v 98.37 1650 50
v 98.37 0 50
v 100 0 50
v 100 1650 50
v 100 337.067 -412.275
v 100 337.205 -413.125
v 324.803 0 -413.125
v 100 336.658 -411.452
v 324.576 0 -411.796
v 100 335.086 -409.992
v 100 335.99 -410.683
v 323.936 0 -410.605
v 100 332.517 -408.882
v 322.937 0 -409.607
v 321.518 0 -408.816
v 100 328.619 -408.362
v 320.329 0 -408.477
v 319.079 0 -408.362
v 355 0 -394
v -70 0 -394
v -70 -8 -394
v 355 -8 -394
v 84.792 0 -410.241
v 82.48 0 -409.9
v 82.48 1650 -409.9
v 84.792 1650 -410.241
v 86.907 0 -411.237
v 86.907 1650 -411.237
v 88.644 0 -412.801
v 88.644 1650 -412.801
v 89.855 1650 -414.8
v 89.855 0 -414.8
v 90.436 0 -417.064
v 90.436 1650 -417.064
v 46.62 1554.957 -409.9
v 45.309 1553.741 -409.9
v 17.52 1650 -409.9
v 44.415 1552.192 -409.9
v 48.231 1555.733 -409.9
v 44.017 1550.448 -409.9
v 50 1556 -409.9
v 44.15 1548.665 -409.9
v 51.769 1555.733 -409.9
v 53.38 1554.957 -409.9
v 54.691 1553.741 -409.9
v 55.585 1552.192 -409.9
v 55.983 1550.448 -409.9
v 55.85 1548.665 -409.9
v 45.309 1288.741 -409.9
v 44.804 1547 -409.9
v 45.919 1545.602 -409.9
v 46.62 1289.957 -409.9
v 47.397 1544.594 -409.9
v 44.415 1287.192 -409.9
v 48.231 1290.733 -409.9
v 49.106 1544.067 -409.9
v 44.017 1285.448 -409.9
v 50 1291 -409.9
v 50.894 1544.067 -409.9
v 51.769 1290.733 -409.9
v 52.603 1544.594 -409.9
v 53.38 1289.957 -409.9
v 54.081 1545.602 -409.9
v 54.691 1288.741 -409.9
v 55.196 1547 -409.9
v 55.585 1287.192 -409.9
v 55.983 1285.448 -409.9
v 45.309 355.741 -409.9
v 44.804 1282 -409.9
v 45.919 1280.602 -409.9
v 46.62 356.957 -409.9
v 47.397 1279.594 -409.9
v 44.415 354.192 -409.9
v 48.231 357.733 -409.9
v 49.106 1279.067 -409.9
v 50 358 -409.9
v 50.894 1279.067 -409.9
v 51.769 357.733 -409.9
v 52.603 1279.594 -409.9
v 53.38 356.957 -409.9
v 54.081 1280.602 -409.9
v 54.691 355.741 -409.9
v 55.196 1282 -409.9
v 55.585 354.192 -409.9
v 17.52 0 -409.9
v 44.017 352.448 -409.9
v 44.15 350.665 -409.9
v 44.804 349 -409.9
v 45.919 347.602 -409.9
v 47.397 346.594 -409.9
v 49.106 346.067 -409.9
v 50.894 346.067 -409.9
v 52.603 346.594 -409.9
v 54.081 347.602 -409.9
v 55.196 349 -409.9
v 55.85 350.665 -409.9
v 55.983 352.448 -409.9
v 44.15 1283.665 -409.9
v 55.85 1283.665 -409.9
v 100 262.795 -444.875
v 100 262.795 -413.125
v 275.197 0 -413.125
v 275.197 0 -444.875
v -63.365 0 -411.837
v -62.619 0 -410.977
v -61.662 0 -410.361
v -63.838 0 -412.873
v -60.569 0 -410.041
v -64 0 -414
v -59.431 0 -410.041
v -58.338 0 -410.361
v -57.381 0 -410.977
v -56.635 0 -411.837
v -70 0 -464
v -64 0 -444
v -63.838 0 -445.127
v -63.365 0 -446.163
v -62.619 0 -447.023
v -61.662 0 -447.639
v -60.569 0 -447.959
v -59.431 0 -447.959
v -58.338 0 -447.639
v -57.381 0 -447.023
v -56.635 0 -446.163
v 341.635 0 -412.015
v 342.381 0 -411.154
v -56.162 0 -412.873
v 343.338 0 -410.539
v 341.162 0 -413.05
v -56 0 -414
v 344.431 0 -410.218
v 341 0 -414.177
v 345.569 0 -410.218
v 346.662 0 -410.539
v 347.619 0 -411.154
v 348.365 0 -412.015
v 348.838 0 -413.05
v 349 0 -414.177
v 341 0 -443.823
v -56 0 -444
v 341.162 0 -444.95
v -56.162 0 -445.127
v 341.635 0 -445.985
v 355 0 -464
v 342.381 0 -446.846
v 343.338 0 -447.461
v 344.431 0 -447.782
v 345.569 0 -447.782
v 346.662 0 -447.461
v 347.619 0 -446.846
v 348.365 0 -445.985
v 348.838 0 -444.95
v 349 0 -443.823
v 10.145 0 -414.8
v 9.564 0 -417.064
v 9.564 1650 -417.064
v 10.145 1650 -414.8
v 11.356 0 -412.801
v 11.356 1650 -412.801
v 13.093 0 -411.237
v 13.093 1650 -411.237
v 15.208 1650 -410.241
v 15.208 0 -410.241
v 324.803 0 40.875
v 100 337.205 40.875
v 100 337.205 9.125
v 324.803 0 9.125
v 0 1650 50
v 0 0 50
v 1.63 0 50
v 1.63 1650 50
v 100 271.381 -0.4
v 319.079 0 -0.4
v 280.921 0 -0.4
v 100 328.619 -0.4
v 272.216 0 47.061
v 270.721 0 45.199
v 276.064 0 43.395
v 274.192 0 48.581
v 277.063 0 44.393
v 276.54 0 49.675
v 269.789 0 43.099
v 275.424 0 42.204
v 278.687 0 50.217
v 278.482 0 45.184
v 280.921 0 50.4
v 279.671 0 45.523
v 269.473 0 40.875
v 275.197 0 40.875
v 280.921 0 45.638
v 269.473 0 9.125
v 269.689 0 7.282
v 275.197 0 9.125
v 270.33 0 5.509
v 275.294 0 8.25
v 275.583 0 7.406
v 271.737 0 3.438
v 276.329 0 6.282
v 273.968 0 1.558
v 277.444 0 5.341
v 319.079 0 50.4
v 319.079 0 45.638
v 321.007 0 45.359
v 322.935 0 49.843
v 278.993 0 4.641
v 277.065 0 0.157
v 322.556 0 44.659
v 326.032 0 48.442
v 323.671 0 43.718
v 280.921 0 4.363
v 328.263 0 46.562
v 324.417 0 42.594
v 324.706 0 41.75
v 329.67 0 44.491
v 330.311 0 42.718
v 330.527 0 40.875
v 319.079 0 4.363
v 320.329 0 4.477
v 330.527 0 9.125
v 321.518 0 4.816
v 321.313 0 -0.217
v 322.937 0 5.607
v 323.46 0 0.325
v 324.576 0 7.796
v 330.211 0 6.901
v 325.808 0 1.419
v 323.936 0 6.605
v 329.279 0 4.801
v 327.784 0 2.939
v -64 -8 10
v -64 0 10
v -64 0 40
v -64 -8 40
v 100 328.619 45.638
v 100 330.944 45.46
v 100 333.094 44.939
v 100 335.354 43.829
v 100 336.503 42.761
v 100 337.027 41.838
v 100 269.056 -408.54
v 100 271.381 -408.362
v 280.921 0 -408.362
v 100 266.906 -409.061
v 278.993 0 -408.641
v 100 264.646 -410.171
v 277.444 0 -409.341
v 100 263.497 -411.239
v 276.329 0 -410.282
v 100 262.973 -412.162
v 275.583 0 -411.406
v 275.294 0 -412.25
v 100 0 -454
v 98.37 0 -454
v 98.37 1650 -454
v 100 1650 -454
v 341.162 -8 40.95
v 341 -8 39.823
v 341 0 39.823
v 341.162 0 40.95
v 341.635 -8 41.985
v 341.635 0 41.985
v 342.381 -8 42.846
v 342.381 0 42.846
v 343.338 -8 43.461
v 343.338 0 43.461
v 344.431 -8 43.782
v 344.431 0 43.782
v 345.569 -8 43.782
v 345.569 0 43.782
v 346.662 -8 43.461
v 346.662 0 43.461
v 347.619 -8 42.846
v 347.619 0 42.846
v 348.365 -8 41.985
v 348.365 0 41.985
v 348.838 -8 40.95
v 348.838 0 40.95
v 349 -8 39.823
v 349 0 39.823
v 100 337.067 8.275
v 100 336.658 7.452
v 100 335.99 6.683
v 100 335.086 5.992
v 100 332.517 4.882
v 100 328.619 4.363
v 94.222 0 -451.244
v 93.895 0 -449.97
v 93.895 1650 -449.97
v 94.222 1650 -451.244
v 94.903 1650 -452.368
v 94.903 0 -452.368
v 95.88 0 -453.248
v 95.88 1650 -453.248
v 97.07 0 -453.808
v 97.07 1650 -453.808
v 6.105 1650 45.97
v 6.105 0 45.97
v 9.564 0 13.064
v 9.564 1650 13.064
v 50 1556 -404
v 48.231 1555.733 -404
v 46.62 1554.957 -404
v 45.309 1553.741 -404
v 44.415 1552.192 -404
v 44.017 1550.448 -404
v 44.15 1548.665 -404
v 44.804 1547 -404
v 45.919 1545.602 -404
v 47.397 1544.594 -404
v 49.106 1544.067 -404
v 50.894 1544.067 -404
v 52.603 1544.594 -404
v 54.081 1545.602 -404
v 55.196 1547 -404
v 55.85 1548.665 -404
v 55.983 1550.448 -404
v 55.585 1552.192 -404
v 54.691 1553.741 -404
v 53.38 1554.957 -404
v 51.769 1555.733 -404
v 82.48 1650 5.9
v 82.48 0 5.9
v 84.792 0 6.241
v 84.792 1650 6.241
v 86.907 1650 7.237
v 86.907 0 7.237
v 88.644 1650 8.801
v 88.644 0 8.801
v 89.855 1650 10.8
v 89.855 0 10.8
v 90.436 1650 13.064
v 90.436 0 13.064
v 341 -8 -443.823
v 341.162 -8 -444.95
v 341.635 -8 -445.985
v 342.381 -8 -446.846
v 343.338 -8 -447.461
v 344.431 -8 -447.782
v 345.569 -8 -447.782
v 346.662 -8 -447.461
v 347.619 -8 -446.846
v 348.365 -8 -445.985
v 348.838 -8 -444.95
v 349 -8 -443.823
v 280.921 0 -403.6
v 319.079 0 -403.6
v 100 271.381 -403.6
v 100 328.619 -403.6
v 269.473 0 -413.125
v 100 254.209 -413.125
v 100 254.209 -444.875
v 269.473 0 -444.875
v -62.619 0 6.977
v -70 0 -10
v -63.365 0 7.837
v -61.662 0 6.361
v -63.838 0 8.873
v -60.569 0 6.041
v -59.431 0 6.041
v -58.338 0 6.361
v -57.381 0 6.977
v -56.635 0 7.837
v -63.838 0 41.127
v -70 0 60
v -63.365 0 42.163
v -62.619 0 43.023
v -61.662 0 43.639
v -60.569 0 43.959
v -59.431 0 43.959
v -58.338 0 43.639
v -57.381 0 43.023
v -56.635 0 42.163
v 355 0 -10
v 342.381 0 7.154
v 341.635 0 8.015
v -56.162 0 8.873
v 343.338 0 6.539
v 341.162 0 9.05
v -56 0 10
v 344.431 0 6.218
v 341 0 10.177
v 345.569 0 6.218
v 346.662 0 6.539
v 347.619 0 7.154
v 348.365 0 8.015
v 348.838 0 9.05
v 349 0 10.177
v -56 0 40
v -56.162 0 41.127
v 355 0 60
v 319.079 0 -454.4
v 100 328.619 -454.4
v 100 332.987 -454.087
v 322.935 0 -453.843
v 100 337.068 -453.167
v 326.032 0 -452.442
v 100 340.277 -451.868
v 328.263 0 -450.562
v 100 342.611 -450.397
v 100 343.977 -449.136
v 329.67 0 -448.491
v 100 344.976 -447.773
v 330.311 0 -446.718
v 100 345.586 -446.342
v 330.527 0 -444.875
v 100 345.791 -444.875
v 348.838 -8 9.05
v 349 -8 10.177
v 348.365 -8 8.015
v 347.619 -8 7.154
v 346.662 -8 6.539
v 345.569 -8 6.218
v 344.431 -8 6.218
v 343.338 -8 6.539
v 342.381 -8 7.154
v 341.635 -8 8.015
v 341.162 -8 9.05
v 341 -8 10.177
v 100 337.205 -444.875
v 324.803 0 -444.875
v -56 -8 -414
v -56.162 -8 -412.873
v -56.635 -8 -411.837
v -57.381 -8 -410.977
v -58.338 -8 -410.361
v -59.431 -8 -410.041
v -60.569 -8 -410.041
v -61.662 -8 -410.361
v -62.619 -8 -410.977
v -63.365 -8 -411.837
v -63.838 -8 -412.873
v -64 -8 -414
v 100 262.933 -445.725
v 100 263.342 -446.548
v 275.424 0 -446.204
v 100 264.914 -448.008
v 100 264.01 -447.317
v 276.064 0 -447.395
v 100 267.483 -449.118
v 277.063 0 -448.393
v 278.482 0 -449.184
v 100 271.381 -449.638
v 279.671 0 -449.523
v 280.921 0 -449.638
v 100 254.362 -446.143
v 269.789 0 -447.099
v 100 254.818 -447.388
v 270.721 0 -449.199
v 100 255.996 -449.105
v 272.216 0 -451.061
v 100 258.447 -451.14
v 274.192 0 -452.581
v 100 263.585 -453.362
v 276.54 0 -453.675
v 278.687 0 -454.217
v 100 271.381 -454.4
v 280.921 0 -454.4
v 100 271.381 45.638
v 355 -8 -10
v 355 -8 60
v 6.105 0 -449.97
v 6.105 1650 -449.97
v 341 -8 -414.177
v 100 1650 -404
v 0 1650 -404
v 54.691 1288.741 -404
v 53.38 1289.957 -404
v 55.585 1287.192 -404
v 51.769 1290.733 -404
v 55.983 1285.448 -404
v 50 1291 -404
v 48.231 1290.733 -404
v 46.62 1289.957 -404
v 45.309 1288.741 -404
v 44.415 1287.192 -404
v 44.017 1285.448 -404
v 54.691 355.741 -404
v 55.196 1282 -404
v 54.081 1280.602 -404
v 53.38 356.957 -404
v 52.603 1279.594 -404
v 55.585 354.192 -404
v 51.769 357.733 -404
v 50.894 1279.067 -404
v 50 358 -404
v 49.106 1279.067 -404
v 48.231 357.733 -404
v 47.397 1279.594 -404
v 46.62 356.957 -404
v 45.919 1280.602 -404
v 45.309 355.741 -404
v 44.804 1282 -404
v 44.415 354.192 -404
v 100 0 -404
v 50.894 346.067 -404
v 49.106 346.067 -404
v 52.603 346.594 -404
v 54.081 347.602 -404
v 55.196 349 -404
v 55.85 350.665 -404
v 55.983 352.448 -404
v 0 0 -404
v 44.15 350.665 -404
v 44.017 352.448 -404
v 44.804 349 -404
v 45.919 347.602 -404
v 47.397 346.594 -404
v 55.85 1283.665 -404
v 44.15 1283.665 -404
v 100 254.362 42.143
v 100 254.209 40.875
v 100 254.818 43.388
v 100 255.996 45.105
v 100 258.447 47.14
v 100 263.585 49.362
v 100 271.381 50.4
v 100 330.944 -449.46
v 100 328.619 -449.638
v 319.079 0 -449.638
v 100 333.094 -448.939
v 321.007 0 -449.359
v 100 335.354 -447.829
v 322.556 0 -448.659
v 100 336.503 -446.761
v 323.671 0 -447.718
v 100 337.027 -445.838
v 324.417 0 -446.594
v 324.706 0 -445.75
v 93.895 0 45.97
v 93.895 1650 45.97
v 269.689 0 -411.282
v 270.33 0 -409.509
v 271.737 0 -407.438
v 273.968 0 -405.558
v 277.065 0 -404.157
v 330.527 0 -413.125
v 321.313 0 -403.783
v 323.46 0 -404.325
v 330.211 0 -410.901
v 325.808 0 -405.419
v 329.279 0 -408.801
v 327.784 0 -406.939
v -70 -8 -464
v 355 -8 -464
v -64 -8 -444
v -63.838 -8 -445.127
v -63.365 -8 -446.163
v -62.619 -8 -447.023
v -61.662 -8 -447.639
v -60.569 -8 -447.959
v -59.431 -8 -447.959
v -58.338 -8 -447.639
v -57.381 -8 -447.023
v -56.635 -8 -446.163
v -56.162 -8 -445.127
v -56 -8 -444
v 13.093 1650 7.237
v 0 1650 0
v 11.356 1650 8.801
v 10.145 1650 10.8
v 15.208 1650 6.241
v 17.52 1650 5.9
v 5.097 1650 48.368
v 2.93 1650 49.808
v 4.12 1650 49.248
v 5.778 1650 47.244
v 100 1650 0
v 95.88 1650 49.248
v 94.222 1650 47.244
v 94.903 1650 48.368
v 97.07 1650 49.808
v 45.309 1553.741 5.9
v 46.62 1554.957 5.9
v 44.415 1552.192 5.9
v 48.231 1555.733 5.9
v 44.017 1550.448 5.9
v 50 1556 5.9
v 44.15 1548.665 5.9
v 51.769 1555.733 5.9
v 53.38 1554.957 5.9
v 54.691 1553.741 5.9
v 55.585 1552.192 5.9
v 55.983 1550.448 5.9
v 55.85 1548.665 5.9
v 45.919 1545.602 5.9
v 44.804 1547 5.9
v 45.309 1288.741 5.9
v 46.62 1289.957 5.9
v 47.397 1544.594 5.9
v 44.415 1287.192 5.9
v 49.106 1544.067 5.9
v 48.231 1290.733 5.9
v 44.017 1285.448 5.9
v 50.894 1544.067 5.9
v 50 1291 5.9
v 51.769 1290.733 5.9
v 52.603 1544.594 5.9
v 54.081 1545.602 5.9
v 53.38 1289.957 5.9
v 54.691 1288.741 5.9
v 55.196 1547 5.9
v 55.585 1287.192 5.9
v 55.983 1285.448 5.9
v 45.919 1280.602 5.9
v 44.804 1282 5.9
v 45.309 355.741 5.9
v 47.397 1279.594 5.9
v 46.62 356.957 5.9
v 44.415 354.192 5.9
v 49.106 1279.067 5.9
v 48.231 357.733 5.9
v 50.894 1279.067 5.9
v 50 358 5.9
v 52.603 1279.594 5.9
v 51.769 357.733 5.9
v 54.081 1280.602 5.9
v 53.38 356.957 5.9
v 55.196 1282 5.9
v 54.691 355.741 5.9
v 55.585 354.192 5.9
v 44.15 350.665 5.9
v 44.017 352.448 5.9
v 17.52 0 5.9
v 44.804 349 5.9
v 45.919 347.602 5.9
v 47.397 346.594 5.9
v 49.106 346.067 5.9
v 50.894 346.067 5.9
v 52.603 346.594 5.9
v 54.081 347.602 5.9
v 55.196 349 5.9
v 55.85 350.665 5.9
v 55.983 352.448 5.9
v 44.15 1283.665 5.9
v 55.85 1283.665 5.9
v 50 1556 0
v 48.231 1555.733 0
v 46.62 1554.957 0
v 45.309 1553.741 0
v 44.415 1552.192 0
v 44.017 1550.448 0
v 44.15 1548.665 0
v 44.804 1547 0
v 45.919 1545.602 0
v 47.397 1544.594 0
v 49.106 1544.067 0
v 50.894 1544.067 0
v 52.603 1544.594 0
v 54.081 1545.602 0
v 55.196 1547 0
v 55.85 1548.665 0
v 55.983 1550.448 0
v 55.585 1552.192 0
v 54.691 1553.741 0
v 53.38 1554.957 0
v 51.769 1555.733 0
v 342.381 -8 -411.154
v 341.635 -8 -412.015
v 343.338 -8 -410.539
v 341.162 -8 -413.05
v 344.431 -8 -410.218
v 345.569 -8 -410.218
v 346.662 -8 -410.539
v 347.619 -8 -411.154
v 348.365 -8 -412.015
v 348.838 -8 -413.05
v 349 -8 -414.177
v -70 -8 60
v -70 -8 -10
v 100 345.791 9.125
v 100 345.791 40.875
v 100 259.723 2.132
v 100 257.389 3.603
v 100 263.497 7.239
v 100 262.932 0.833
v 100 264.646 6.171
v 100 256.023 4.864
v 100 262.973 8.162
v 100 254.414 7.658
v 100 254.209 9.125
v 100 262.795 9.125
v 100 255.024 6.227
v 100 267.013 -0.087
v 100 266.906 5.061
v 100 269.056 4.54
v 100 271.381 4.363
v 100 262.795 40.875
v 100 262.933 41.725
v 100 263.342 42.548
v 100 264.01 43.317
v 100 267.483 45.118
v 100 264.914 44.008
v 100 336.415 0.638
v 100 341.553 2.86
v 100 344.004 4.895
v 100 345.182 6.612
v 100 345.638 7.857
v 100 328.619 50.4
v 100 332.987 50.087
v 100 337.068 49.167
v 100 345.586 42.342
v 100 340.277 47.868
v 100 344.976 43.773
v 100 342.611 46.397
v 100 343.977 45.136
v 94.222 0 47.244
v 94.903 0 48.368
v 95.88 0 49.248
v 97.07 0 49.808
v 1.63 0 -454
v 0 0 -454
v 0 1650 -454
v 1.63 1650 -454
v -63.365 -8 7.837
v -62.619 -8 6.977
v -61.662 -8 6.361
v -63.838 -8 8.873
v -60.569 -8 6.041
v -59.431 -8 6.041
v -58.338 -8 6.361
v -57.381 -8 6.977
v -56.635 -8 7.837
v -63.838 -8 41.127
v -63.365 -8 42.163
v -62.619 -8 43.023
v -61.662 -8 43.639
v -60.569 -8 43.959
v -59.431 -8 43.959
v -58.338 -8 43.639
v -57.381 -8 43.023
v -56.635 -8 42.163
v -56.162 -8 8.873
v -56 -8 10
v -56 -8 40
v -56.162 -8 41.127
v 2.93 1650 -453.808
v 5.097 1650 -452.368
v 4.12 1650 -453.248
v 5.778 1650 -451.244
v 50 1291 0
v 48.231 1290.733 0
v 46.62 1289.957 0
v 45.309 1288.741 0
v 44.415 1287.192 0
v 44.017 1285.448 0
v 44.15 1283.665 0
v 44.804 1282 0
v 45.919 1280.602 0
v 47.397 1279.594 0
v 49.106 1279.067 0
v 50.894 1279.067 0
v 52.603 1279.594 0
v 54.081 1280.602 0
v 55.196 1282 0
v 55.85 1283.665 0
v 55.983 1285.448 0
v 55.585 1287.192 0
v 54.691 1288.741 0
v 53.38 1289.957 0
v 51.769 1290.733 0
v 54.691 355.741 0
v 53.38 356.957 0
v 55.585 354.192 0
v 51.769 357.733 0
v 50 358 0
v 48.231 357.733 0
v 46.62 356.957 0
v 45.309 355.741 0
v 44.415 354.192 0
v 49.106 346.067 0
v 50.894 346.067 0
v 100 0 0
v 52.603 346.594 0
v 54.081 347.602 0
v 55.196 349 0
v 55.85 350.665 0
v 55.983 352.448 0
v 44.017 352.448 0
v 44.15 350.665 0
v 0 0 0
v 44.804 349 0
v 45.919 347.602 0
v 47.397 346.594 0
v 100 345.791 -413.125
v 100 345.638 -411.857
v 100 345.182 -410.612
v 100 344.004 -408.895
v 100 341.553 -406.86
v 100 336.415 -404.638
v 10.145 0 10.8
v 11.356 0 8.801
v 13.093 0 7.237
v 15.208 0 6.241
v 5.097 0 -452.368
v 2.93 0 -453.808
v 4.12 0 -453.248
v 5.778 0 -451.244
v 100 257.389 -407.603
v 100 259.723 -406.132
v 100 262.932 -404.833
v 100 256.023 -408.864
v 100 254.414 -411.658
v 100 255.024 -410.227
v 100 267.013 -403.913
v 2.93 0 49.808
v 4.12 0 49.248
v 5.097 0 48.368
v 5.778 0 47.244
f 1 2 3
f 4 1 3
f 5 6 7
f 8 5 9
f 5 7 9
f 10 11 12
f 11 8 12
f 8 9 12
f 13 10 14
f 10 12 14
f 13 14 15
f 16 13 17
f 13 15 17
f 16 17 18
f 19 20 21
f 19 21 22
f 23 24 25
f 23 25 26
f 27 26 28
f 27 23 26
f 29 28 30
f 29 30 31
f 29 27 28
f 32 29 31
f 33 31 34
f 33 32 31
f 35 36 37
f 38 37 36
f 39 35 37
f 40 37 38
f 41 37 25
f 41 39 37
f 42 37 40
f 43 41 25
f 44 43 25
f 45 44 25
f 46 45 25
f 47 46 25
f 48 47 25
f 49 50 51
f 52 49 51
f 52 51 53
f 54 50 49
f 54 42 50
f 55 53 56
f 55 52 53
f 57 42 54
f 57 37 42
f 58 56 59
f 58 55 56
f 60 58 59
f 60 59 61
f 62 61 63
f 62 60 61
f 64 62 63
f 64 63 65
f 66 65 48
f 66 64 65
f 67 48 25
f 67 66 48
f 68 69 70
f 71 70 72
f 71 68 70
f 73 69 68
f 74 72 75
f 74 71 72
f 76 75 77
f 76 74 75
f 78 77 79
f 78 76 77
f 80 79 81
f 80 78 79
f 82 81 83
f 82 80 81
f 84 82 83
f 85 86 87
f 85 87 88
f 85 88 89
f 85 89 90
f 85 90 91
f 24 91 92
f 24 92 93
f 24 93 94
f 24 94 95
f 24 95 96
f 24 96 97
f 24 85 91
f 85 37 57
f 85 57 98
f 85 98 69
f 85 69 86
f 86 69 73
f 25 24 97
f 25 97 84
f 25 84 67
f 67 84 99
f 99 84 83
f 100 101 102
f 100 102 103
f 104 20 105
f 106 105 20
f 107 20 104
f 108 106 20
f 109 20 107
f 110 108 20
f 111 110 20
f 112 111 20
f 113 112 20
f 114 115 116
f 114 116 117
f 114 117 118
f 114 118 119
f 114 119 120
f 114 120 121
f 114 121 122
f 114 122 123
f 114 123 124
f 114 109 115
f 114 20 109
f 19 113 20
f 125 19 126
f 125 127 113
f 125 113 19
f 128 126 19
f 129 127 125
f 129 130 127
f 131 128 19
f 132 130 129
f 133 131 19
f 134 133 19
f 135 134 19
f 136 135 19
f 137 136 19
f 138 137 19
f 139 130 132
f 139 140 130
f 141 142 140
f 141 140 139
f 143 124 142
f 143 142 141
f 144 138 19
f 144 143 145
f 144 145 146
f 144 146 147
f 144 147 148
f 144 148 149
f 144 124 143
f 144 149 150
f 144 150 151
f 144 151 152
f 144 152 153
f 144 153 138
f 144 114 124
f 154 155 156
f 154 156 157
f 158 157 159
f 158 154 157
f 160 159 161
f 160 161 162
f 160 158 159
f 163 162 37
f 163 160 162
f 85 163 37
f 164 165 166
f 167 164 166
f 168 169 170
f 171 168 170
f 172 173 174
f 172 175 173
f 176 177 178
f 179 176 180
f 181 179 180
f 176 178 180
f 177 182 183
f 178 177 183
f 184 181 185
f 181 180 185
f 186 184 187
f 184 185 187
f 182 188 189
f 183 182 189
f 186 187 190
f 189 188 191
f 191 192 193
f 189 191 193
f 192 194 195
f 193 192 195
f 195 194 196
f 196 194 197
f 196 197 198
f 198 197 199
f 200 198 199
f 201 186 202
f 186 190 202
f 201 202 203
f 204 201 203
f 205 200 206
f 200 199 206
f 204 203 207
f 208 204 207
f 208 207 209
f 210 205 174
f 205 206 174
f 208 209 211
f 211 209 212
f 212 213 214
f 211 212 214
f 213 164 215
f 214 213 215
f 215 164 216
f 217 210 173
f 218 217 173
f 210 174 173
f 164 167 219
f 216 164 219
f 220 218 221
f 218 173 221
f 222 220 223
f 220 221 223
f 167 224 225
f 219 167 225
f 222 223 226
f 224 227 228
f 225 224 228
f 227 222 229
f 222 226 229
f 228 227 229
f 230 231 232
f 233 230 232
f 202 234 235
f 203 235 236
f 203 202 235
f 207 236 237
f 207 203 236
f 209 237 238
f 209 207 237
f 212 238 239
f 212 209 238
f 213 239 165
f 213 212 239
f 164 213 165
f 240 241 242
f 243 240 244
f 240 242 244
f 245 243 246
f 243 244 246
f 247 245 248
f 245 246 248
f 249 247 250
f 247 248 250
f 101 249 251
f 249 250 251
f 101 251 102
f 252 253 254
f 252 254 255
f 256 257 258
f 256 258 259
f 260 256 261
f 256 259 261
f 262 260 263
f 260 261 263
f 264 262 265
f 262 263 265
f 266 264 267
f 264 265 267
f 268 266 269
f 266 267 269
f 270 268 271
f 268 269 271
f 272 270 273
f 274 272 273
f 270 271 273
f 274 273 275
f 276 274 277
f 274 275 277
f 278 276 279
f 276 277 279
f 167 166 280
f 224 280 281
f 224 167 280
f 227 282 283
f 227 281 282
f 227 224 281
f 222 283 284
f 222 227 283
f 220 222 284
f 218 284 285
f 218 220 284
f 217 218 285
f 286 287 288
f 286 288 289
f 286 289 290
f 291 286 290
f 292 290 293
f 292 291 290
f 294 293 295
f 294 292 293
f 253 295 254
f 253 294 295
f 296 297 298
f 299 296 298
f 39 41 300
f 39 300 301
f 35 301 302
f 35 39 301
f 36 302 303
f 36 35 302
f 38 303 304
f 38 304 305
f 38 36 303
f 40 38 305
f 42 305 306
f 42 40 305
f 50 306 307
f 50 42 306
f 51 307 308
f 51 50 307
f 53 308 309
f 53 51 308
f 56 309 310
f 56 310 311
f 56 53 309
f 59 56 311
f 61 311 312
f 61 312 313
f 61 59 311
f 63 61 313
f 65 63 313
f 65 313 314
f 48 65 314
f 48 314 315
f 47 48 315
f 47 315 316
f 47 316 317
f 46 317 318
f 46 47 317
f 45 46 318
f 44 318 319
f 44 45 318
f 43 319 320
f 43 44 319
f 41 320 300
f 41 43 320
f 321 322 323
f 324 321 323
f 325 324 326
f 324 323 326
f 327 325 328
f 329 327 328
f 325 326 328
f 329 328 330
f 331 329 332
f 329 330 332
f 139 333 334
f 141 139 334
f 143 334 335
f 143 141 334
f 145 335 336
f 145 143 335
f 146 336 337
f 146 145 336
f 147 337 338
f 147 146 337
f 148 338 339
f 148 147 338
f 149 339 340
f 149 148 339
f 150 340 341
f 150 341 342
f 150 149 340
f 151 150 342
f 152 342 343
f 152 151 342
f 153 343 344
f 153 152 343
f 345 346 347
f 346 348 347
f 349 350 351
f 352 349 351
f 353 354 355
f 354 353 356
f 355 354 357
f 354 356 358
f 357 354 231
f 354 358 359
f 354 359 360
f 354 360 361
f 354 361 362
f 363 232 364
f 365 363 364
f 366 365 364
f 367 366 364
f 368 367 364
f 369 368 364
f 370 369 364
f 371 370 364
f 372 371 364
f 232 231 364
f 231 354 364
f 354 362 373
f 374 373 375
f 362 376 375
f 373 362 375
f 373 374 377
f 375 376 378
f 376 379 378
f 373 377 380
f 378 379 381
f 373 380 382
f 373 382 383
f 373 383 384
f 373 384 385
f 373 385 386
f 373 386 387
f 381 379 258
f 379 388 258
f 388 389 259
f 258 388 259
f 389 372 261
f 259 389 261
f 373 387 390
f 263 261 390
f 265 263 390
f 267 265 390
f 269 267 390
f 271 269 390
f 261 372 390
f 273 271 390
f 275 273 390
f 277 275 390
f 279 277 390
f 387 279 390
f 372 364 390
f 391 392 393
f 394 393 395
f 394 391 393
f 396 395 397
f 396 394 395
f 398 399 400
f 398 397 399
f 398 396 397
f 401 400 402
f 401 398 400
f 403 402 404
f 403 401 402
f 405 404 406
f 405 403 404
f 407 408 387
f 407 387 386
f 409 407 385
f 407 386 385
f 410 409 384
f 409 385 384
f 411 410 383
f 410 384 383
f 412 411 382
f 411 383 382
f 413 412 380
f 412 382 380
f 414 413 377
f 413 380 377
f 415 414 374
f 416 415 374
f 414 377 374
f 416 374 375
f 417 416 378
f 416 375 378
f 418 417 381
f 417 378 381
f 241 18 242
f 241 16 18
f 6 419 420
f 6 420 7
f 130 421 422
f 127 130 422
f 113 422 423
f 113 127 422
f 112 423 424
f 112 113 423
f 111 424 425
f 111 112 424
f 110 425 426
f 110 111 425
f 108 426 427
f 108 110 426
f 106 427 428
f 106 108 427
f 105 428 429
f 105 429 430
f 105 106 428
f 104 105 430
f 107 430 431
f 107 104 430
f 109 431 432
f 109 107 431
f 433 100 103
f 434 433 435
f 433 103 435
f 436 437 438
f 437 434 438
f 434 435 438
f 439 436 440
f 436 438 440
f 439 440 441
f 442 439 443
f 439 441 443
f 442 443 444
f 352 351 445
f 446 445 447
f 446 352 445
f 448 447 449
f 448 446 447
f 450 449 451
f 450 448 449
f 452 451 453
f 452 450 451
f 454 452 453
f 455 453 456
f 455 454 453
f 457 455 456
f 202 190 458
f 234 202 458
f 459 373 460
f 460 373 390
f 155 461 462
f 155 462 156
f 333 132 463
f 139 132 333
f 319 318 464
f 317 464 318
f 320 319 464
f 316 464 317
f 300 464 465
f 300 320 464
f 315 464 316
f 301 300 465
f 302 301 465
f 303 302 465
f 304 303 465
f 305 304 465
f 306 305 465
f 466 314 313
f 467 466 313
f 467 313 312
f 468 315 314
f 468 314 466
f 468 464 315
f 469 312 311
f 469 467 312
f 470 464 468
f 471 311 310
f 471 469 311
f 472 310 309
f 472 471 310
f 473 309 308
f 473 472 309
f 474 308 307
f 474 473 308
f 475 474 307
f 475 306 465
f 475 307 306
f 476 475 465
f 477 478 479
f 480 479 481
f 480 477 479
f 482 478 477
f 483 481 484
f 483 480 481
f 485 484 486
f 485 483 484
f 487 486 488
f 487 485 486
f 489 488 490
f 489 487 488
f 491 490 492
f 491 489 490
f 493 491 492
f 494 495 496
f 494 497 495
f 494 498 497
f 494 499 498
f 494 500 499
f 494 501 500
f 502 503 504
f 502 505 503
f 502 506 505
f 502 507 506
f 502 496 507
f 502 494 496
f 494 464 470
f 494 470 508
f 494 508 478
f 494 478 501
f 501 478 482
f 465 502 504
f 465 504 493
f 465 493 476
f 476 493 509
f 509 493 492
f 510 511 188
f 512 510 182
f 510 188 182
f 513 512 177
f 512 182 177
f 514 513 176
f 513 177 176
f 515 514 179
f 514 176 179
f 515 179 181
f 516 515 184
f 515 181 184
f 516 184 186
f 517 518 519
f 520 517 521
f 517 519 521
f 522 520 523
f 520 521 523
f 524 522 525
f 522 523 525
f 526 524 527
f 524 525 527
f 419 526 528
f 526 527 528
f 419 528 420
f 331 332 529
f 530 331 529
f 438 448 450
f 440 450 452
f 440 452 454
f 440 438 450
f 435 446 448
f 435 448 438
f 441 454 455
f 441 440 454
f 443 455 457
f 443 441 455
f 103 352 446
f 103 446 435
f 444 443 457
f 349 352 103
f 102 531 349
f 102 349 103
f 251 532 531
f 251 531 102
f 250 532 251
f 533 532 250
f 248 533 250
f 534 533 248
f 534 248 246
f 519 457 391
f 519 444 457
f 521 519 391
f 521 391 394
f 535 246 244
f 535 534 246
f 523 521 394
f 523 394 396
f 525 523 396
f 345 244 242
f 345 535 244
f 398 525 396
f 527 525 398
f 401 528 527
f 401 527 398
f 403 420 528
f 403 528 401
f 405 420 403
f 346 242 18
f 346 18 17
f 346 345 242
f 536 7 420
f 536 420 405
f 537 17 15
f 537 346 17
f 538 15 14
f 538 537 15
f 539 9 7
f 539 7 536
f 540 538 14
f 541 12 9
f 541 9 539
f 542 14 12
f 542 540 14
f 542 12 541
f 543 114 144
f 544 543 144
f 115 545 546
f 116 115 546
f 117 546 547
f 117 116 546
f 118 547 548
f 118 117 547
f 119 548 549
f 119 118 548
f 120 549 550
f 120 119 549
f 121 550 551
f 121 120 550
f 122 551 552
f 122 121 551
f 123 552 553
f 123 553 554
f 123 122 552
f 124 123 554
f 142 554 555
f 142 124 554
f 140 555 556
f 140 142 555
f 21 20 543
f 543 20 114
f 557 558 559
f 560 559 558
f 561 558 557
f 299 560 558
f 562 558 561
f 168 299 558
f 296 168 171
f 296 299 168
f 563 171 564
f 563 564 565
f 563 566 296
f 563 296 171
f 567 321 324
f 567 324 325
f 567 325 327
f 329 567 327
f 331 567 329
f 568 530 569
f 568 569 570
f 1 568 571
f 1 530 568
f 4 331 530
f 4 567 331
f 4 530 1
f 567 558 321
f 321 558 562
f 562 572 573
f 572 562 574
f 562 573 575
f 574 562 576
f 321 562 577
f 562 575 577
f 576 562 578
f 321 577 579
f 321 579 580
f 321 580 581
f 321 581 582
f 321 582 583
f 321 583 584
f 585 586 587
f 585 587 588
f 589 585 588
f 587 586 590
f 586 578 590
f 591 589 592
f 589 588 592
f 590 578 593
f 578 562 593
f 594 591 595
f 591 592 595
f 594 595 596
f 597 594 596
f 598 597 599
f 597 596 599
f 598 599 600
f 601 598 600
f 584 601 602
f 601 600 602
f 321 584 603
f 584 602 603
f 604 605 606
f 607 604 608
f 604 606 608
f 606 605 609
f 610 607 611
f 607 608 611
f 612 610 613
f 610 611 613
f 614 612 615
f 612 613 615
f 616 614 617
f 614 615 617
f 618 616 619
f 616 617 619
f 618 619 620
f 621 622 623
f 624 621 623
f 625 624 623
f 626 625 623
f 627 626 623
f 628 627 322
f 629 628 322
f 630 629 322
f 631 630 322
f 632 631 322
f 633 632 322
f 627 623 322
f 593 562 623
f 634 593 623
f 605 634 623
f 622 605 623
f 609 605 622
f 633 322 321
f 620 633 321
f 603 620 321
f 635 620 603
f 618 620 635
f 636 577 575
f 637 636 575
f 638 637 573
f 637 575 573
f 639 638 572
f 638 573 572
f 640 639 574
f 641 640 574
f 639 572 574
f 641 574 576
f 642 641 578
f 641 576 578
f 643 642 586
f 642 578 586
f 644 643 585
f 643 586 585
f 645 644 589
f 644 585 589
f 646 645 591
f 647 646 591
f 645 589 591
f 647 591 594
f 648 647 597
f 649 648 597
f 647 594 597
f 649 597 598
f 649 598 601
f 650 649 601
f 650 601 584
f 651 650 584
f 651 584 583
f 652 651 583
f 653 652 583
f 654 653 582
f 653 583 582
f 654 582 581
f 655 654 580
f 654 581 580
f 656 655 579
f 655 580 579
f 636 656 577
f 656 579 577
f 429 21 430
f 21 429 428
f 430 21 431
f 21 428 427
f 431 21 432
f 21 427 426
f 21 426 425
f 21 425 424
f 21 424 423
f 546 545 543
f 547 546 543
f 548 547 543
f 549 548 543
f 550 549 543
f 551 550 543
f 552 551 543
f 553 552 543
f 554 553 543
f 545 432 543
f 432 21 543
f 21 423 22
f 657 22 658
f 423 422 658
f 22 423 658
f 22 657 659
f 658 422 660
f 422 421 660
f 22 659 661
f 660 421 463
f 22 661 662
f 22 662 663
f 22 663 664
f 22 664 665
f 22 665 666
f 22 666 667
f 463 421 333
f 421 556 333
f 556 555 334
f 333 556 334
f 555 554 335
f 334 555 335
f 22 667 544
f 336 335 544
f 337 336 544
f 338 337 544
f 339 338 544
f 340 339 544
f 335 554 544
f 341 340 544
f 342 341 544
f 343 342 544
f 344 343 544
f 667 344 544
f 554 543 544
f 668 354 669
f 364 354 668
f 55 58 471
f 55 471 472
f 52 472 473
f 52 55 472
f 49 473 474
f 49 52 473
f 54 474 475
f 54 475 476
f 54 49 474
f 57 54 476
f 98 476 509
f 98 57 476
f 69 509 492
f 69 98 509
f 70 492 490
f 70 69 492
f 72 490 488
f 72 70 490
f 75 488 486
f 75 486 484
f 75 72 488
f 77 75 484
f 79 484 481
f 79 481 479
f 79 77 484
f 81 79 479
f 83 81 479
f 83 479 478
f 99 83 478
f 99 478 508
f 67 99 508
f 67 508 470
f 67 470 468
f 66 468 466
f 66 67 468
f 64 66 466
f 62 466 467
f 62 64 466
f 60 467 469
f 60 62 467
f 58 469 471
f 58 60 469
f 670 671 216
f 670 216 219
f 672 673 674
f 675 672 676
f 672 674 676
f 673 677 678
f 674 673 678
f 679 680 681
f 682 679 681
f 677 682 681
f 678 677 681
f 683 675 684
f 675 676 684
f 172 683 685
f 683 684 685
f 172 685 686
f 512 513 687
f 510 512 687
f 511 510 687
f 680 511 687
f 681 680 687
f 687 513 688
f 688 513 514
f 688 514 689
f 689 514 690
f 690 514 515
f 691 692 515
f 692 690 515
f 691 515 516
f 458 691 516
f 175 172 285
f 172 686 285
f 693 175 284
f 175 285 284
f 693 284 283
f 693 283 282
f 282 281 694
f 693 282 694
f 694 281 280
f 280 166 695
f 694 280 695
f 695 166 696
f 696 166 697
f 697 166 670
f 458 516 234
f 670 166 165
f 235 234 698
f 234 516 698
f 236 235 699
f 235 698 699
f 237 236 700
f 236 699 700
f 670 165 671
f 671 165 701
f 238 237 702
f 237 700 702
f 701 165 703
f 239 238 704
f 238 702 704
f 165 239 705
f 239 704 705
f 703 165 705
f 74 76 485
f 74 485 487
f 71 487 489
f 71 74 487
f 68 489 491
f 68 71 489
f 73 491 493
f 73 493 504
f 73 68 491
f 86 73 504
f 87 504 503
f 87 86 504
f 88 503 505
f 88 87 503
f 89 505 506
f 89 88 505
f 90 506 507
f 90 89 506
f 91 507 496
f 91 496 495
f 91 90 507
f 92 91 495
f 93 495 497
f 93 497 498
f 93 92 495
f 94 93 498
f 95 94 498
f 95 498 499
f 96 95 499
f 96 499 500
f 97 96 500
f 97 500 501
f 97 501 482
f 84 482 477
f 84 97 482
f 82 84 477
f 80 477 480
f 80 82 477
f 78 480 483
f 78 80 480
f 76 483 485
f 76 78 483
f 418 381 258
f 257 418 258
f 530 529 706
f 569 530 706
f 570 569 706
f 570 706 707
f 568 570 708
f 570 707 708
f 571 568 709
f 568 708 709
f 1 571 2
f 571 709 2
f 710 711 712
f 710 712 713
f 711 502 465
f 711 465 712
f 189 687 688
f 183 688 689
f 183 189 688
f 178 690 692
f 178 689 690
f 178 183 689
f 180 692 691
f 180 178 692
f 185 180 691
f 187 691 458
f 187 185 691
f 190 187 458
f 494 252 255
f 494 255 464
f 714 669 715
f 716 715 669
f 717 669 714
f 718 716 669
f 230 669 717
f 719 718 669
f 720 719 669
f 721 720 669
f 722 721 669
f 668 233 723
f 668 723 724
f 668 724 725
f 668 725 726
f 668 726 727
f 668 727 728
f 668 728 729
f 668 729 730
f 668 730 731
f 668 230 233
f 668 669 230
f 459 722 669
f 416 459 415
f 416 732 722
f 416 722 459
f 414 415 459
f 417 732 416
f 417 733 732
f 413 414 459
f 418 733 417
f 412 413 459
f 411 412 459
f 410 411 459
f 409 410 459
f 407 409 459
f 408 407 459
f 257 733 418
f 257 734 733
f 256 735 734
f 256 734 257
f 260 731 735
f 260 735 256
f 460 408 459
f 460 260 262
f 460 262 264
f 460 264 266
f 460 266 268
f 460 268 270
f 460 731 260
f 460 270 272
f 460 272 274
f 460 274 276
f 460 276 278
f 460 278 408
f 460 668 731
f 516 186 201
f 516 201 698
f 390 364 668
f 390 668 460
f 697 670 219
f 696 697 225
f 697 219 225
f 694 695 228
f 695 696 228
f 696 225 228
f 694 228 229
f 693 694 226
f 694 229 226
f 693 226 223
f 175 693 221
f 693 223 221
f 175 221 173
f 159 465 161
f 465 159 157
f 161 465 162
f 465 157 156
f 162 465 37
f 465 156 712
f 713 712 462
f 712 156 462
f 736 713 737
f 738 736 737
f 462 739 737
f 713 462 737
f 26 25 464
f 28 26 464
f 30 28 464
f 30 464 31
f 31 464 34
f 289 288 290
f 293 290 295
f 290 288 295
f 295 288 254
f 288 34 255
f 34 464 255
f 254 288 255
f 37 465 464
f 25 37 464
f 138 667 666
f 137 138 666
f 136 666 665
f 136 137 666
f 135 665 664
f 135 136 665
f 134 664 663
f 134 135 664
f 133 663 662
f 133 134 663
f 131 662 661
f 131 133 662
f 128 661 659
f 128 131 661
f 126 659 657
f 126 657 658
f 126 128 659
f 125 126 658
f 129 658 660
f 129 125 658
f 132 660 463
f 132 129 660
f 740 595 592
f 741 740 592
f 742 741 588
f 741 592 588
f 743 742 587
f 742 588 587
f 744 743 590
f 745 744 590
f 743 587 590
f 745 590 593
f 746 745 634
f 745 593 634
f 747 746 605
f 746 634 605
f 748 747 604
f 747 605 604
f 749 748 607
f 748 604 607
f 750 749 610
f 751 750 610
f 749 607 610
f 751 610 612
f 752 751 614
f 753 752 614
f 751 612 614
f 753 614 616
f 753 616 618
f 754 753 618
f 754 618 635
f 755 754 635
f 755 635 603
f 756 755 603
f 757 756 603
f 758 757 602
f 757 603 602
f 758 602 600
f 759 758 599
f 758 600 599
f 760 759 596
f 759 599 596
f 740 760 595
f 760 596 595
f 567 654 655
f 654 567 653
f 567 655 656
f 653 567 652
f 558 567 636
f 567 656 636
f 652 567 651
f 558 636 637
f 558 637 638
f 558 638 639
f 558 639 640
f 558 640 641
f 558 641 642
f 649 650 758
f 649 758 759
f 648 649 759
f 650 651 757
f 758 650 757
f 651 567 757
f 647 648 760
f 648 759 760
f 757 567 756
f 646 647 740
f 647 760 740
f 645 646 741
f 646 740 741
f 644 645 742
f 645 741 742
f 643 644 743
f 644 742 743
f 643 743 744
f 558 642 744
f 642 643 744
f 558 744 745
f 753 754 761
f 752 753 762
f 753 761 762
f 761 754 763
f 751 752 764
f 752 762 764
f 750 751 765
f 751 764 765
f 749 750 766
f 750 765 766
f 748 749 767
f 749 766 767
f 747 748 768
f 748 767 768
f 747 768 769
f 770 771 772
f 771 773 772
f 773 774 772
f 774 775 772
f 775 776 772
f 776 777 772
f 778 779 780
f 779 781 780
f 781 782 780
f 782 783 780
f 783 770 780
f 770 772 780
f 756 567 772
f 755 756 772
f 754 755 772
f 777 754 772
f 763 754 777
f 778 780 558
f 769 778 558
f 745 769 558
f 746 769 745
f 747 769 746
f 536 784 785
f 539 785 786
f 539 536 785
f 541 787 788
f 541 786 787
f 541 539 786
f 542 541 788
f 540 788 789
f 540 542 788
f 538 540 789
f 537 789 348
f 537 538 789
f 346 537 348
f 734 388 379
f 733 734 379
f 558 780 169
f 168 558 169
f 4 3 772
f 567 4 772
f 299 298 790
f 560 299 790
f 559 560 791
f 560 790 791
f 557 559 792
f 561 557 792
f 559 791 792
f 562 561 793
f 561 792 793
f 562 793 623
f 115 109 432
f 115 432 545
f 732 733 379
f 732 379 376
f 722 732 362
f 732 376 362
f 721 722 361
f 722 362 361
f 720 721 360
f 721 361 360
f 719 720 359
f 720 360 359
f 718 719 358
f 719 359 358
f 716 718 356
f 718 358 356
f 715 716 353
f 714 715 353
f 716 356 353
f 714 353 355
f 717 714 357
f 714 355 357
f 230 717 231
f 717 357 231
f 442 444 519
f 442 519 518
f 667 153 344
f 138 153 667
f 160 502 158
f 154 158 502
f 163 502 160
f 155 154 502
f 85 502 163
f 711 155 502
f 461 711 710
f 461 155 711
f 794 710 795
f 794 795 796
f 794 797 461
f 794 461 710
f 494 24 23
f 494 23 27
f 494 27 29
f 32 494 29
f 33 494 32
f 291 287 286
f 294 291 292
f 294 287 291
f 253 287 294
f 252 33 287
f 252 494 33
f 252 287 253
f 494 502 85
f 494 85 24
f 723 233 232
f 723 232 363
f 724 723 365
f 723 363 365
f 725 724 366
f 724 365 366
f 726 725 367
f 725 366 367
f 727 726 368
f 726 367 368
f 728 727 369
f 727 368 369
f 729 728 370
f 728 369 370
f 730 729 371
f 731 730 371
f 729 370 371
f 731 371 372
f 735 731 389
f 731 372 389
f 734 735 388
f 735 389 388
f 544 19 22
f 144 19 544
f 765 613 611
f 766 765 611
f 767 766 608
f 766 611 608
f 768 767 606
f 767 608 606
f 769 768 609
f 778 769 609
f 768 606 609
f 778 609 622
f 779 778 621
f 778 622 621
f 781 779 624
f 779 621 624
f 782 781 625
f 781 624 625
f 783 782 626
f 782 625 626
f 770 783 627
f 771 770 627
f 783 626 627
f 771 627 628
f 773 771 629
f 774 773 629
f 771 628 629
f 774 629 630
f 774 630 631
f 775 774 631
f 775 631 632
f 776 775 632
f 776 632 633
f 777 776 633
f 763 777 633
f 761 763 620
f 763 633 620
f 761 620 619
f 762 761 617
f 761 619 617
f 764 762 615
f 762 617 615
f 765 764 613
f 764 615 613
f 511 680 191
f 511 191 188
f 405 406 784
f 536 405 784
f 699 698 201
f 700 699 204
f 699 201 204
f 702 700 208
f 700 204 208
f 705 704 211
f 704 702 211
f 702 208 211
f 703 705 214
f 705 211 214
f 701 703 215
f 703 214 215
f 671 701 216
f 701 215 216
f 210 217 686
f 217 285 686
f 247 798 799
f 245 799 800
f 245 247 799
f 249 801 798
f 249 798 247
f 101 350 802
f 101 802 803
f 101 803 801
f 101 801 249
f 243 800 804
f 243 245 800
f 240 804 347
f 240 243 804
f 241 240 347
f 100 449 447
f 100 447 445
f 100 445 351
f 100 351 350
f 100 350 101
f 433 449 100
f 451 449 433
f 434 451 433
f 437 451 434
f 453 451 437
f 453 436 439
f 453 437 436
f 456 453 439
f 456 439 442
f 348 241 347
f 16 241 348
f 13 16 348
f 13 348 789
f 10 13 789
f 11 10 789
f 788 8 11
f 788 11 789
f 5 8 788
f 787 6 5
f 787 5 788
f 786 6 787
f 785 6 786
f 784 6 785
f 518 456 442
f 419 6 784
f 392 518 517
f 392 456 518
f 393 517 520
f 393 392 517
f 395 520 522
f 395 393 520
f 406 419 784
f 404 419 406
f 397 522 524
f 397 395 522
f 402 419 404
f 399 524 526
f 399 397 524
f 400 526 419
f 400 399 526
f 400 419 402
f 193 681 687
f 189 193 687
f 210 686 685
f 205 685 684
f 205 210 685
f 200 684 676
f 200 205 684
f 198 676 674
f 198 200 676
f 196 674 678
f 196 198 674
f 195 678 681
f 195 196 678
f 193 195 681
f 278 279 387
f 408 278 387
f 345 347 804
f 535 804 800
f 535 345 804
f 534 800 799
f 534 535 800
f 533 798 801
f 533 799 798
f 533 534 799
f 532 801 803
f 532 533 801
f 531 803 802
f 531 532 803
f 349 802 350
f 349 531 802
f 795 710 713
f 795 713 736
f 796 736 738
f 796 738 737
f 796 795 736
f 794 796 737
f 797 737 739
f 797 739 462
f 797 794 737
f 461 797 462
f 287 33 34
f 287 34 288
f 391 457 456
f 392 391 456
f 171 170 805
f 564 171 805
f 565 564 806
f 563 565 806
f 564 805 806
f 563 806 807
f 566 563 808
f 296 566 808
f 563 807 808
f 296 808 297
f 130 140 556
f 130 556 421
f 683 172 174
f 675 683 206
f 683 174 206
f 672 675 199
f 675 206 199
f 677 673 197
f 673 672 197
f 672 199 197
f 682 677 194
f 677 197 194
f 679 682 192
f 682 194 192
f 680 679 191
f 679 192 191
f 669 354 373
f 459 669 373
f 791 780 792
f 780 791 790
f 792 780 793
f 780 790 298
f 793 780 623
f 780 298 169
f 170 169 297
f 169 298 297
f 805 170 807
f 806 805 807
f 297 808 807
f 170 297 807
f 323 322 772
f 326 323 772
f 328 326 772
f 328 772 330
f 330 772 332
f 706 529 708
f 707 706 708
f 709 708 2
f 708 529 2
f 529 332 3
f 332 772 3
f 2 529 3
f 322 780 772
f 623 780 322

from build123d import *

# Parameters (mm, degrees)
CEOWNIK_C_100_X_10_1_DEPTH                     = 1650
SZKIC21_W                                      = 425
SZKIC21_H                                      = 70
DODANIE_WYCI_GNI_CIE1_DEPTH                    = 8
RURA_CIENKO_CIENNA_KWADRATOWA_TS2X2X0_18_DEPTH = 524.856349859
SZKIC59_W                                      = 6
SZKIC59_H                                      = 60
OTWORY_USTALAJ_CE_12_0MM1_AT_2_COUNT           = 2
OTWORY_USTALAJ_CE_12_0MM1_AT_2_PITCH           = 265
OTWORY_USTALAJ_CE_12_0MM1_AT_3_COUNT           = 2
OTWORY_USTALAJ_CE_12_0MM1_AT_3_PITCH           = 1198


# Read off the part's stored shape, not the designer's step: Przytnij/Wydłuż2, Przytnij/Wydłuż3
with BuildPart() as part:
    # Sketch118 → Ceownik c 100 X 10(1) (new body)
    with BuildSketch(Plane.ZX):
        with BuildLine():
            Line((50, 100), (0, 100))
            Line((0, 100), (0, 0))
            Line((0, 0), (50, 0))
            Line((50, 0), (50, 1.629852671))
            ThreePointArc((50, 1.629852671), (48.844151715, 4.6409404), (45.970378085, 6.1052012))
            Line((45.970378085, 6.1052012), (13.063772294, 9.563824837))
            ThreePointArc((13.063772294, 9.563824837), (7.954841396, 12.166955149), (5.9, 17.52))
            Line((5.9, 17.52), (5.9, 82.48))
            ThreePointArc((5.9, 82.48), (7.954841396, 87.833044851), (13.063772294, 90.436175163))
            Line((13.063772294, 90.436175163), (45.970378085, 93.8947988))
            ThreePointArc((45.970378085, 93.8947988), (48.844151715, 95.3590596), (50, 98.370147329))
            Line((50, 98.370147329), (50, 100))
        make_face()
    extrude(amount=CEOWNIK_C_100_X_10_1_DEPTH)

    # Szkic59 → Otwory ustalające Ø12.0mm1 (revolve, cut)
    with BuildSketch(Plane(origin=(50, 1550, 0), x_dir=(0, 1, 0), z_dir=(1, 0, 0))):
        with Locations((3, 30)):
            Rectangle(SZKIC59_W, SZKIC59_H)
    otwory_ustalaj_ce_12_0mm1 = revolve(axis=Axis((50, 1550, -6.35), (0, 0, 1)), mode=Mode.SUBTRACT)

    # Otwory ustalające Ø12.0mm1 at 2: Otwory ustalające Ø12.0mm1 ×2
    with Locations(*[(0, -i * OTWORY_USTALAJ_CE_12_0MM1_AT_2_PITCH, 0) for i in range(1, OTWORY_USTALAJ_CE_12_0MM1_AT_2_COUNT)]):
        add(otwory_ustalaj_ce_12_0mm1, mode=Mode.SUBTRACT)

    # Otwory ustalające Ø12.0mm1 at 3: Otwory ustalające Ø12.0mm1 ×2
    with Locations(*[(0, -i * OTWORY_USTALAJ_CE_12_0MM1_AT_3_PITCH, 0) for i in range(1, OTWORY_USTALAJ_CE_12_0MM1_AT_3_COUNT)]):
        add(otwory_ustalaj_ce_12_0mm1, mode=Mode.SUBTRACT)


with BuildPart() as body_2:
    # Szkic21 → Dodanie-wyciągnięcie1 (new body)
    with BuildSketch(Plane.XZ):
        with Locations((142.5, 25)):
            Rectangle(SZKIC21_W, SZKIC21_H)
        with BuildLine():
            Line((-56, 40), (-56, 10))
            ThreePointArc((-56, 10), (-60, 6), (-64, 10))
            Line((-64, 10), (-64, 40))
            ThreePointArc((-64, 40), (-60, 44), (-56, 40))
        make_face(mode=Mode.SUBTRACT)
        with BuildLine():
            Line((349, 39.822910334), (349, 10.177089666))
            ThreePointArc((349, 10.177089666), (345, 6.177089666), (341, 10.177089666))
            Line((341, 10.177089666), (341, 39.822910334))
            ThreePointArc((341, 39.822910334), (345, 43.822910334), (349, 39.822910334))
        make_face(mode=Mode.SUBTRACT)
    extrude(amount=DODANIE_WYCI_GNI_CIE1_DEPTH)


with BuildPart() as body_3:
    # Sketch1 → Rura cienkościenna kwadratowa TS2X2X0.1875(1) (new body)
    with BuildSketch(Plane(origin=(339.472914964, -59.209372446, 25), x_dir=(0.8320502943378437, 0.5547001962252293, 0), z_dir=(-0.5547001962252293, 0.8320502943378437, 0))):
        with BuildLine():
            Line((-15.875, -25.4), (15.875, -25.4))
            ThreePointArc((15.875, -25.4), (22.610192091, -22.610192091), (25.4, -15.875))
            Line((25.4, -15.875), (25.4, 15.875))
            ThreePointArc((25.4, 15.875), (22.610192091, 22.610192091), (15.875, 25.4))
            Line((15.875, 25.4), (-15.875, 25.4))
            ThreePointArc((-15.875, 25.4), (-22.610192091, 22.610192091), (-25.4, 15.875))
            Line((-25.4, 15.875), (-25.4, -15.875))
            ThreePointArc((-25.4, -15.875), (-22.610192091, -22.610192091), (-15.875, -25.4))
        make_face()
        with BuildLine():
            Line((-15.875, -20.6375), (15.875, -20.6375))
            ThreePointArc((15.875, -20.6375), (19.242596045, -19.242596045), (20.6375, -15.875))
            Line((20.6375, -15.875), (20.6375, 15.875))
            ThreePointArc((20.6375, 15.875), (19.242596045, 19.242596045), (15.875, 20.6375))
            Line((15.875, 20.6375), (-15.875, 20.6375))
            ThreePointArc((-15.875, 20.6375), (-19.242596045, 19.242596045), (-20.6375, 15.875))
            Line((-20.6375, 15.875), (-20.6375, -15.875))
            ThreePointArc((-20.6375, -15.875), (-19.242596045, -19.242596045), (-15.875, -20.6375))
        make_face(mode=Mode.SUBTRACT)
    extrude(amount=RURA_CIENKO_CIENNA_KWADRATOWA_TS2X2X0_18_DEPTH)


with BuildPart() as body_4:
    # Przytnij/Wydłuż2: the piece on the far side of the plane
    add(body_3.part)
    split(bisect_by=Plane(origin=(0, 0, 0), x_dir=(1, 0, 0), z_dir=(0, 1, 0)), keep=Keep.BOTTOM)


with BuildPart() as body_3_1:
    add(body_3.part)

    # Przytnij/Wydłuż2
    split(bisect_by=Plane(origin=(0, 0, 0), x_dir=(1, 0, 0), z_dir=(0, 1, 0)), keep=Keep.TOP)


with BuildPart() as body_4_2:
    # Przytnij/Wydłuż3: the piece on the far side of the plane
    add(body_3_1.part)
    split(bisect_by=Plane.YZ.offset(100), keep=Keep.BOTTOM)


with BuildPart() as body_3_2:
    add(body_3_1.part)

    # Przytnij/Wydłuż3
    split(bisect_by=Plane.YZ.offset(100), keep=Keep.TOP)


with BuildPart() as body_4_3:
    # Lustro3: mirrored copy
    add(part.part.mirror(Plane(origin=(0, 0, -202), x_dir=(1, 0, 0), z_dir=(0, 0, -1))))


with BuildPart() as body_5:
    # Lustro3 2: mirrored copy
    add(body_3_2.part.mirror(Plane(origin=(0, 0, -202), x_dir=(1, 0, 0), z_dir=(0, 0, -1))))


with BuildPart() as body_6:
    # Lustro3 3: mirrored copy
    add(body_2.part.mirror(Plane(origin=(0, 0, -202), x_dir=(1, 0, 0), z_dir=(0, 0, -1))))


solid = Compound([part.part, body_2.part, body_3_2.part, body_4_3.part, body_5.part, body_6.part])
